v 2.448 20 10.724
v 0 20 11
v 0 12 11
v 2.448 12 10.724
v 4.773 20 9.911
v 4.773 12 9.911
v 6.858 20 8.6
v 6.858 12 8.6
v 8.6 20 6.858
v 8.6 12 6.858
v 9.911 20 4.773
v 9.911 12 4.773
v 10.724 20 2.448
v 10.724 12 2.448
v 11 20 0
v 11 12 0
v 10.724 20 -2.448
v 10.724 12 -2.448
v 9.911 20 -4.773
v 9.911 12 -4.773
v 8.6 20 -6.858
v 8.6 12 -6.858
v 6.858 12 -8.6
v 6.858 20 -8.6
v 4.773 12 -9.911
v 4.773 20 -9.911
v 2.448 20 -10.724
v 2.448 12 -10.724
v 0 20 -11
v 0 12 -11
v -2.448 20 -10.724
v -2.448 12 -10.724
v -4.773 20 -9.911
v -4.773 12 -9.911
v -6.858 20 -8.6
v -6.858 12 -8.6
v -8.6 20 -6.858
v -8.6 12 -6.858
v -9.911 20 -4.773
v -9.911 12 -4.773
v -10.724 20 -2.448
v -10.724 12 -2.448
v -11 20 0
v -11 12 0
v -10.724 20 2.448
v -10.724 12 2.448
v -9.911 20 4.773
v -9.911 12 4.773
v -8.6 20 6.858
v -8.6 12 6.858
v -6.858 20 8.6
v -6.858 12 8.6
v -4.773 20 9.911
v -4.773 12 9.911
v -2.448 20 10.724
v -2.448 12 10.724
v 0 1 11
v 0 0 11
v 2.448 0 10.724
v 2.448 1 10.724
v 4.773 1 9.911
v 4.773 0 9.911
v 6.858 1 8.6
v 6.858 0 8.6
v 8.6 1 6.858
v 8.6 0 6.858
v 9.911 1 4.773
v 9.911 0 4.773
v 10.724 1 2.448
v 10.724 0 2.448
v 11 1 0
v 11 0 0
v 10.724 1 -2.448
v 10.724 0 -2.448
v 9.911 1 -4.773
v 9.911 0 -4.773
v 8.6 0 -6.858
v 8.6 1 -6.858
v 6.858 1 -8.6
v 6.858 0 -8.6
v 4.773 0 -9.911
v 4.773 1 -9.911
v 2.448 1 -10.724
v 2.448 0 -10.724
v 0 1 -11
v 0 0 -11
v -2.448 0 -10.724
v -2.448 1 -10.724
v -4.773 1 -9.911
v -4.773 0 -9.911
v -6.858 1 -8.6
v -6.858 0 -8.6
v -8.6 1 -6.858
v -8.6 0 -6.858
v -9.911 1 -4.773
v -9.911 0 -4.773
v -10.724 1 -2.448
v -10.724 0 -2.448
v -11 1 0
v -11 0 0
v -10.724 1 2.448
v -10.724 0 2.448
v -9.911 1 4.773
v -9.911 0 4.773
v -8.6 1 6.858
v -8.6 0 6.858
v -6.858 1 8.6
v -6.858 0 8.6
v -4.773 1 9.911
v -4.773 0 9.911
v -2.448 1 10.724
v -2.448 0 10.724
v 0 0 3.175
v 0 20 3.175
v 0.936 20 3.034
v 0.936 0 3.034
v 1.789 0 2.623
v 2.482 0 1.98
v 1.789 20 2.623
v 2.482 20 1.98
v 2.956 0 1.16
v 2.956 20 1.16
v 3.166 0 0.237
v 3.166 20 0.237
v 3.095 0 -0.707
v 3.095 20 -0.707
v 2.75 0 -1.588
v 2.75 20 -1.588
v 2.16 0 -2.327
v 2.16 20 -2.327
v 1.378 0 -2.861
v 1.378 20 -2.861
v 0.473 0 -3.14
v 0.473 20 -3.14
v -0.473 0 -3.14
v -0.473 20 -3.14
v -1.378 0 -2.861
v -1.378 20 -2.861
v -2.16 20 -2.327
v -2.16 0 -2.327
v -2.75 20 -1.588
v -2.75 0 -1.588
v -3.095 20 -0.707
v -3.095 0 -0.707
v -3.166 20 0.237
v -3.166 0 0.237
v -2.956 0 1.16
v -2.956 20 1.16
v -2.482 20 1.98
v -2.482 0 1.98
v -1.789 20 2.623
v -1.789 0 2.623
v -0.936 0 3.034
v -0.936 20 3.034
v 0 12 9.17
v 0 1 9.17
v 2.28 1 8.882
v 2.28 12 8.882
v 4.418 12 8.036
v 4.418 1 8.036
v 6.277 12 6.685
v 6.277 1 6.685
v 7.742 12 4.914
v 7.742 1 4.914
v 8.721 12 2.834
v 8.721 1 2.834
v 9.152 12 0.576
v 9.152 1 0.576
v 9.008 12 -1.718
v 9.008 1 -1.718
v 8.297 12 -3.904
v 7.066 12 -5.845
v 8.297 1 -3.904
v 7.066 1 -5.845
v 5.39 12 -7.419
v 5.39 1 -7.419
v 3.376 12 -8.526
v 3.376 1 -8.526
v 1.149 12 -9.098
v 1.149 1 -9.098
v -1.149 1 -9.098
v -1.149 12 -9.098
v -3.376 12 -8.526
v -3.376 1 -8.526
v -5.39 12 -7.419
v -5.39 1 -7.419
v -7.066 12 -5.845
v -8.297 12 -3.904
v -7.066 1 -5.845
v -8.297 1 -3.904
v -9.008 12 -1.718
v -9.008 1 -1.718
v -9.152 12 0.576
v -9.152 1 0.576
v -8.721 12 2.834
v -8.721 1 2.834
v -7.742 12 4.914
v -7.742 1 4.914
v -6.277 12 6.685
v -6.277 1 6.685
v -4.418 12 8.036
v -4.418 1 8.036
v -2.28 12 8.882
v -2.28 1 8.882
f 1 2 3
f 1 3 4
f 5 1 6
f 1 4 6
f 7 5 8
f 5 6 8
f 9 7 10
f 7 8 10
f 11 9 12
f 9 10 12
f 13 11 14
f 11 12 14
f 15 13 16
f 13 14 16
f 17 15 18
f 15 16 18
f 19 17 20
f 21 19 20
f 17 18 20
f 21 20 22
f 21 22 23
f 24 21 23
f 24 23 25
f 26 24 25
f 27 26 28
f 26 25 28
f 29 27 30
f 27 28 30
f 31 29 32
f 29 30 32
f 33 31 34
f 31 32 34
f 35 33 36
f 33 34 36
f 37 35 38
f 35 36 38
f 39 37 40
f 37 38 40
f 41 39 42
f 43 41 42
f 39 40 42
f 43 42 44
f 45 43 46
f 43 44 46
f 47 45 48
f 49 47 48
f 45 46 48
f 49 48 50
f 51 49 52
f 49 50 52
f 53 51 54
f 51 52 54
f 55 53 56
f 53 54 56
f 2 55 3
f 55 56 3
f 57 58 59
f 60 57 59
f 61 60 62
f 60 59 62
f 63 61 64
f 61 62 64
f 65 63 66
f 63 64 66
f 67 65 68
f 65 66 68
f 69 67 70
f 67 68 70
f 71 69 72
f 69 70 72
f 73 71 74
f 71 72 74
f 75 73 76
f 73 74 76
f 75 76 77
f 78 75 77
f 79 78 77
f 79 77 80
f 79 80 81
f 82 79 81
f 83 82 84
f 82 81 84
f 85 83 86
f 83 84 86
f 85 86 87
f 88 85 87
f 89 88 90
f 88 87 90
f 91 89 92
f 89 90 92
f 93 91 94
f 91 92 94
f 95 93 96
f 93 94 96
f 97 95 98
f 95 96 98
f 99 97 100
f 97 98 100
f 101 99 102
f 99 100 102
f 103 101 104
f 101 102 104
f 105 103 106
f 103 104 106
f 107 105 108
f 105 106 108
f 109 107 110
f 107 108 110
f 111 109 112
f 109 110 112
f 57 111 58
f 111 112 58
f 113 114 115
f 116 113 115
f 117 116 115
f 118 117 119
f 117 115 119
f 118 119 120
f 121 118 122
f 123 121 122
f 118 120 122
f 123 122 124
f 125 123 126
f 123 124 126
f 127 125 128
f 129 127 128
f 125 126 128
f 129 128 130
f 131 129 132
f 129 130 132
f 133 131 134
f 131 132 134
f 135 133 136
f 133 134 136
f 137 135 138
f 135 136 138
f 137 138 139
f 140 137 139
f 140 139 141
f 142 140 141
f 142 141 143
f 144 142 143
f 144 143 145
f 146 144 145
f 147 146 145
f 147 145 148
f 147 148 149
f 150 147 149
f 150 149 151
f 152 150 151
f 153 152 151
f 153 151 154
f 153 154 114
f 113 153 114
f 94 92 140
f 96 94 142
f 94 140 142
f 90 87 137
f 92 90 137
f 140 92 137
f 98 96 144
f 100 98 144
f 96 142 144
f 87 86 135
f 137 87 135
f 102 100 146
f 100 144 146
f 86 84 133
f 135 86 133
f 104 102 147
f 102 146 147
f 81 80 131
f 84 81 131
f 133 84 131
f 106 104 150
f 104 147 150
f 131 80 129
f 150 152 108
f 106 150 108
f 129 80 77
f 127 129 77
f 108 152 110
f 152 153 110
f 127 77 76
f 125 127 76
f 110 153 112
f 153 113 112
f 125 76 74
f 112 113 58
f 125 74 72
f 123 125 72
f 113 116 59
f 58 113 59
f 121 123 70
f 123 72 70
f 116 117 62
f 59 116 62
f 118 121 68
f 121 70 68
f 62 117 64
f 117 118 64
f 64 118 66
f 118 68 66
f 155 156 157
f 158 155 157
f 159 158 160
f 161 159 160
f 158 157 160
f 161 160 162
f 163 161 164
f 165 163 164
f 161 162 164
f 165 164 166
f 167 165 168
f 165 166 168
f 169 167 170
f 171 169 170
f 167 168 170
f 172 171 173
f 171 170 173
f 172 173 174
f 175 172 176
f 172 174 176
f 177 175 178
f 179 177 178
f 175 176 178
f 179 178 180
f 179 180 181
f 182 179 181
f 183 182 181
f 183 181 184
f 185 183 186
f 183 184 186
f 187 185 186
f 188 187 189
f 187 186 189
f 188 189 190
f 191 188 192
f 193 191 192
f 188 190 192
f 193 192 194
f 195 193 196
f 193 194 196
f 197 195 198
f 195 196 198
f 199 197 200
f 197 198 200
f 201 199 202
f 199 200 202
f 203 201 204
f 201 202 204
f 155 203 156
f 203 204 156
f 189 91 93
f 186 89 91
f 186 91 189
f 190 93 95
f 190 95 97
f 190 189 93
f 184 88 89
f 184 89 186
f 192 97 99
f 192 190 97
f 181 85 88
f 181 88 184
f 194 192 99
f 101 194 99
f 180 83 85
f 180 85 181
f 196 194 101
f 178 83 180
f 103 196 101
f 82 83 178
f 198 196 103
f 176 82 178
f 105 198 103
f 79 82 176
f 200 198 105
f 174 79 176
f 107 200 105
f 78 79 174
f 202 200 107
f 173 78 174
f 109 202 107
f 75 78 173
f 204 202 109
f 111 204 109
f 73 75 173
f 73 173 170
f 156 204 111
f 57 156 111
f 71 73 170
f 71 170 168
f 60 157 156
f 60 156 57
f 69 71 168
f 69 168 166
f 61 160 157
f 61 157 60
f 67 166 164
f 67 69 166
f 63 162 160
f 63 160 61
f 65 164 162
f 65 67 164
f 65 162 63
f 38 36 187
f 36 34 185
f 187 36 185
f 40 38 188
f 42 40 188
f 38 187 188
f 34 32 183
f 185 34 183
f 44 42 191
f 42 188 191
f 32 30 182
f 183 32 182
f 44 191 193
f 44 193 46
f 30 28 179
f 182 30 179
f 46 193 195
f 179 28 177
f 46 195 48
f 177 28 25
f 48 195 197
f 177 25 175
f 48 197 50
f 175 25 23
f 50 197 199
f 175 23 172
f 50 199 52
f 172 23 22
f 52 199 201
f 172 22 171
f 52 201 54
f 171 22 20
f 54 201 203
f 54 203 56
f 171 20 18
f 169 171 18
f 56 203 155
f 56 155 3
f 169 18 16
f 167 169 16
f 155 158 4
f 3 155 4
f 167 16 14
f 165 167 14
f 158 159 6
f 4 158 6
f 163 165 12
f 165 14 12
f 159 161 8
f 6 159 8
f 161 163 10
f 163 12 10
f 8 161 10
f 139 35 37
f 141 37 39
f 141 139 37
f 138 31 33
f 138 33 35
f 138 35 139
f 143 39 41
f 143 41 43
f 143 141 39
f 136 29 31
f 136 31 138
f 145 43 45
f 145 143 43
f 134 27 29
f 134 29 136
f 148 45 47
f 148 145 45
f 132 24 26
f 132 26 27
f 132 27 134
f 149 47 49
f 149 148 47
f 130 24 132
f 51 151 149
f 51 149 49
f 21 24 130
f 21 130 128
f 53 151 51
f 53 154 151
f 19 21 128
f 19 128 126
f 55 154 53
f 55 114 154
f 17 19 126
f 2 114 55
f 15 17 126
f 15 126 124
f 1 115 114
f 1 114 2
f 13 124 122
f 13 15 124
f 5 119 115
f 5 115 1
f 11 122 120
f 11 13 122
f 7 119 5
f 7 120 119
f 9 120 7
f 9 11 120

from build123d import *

# Parameters (mm, degrees)
SKETCH_1_R          = 11
EXTRUDE_1_DEPTH     = 1
SKETCH_2_R          = 9.17
EXTRUDE_2_DEPTH     = 11
SKETCH_3_R          = 11
EXTRUDE_3_DEPTH     = 8
SKETCH_4_R          = 3.175
CUT_EXTRUDE_1_DEPTH = 26.337718919


with BuildPart() as part:
    # Эскиз1 → Бобышка-Вытянуть1 (new body)
    with BuildSketch(Plane(origin=(0, 0, 0), x_dir=(1, 0, 0), z_dir=(0, 1, 0))):
        with Locations(Location((0, 0, 0), (0, 0, 270))):
            Circle(SKETCH_1_R)
    extrude(amount=EXTRUDE_1_DEPTH)

    # Эскиз2 → Бобышка-Вытянуть2 (add)
    with BuildSketch(Plane(origin=(0, 1, 0), x_dir=(1, 0, 0), z_dir=(0, 1, 0))):
        with Locations(Location((0, 0, 0), (0, 0, 270))):
            Circle(SKETCH_2_R)
    extrude(amount=EXTRUDE_2_DEPTH)

    # Эскиз3 → Бобышка-Вытянуть3 (add)
    with BuildSketch(Plane(origin=(0, 12, 0), x_dir=(1, 0, 0), z_dir=(0, 1, 0))):
        with Locations(Location((0, 0, 0), (0, 0, 270))):
            Circle(SKETCH_3_R)
    extrude(amount=EXTRUDE_3_DEPTH)

    # Эскиз4 → Вырез-Вытянуть1 (cut, through all)
    with BuildSketch(Plane(origin=(0, 20, 0), x_dir=(1, 0, 0), z_dir=(0, 1, 0))):
        with Locations(Location((0, 0, 0), (0, 0, 270))):
            Circle(SKETCH_4_R)
    extrude(amount=-CUT_EXTRUDE_1_DEPTH, mode=Mode.SUBTRACT)


solid = part.part
